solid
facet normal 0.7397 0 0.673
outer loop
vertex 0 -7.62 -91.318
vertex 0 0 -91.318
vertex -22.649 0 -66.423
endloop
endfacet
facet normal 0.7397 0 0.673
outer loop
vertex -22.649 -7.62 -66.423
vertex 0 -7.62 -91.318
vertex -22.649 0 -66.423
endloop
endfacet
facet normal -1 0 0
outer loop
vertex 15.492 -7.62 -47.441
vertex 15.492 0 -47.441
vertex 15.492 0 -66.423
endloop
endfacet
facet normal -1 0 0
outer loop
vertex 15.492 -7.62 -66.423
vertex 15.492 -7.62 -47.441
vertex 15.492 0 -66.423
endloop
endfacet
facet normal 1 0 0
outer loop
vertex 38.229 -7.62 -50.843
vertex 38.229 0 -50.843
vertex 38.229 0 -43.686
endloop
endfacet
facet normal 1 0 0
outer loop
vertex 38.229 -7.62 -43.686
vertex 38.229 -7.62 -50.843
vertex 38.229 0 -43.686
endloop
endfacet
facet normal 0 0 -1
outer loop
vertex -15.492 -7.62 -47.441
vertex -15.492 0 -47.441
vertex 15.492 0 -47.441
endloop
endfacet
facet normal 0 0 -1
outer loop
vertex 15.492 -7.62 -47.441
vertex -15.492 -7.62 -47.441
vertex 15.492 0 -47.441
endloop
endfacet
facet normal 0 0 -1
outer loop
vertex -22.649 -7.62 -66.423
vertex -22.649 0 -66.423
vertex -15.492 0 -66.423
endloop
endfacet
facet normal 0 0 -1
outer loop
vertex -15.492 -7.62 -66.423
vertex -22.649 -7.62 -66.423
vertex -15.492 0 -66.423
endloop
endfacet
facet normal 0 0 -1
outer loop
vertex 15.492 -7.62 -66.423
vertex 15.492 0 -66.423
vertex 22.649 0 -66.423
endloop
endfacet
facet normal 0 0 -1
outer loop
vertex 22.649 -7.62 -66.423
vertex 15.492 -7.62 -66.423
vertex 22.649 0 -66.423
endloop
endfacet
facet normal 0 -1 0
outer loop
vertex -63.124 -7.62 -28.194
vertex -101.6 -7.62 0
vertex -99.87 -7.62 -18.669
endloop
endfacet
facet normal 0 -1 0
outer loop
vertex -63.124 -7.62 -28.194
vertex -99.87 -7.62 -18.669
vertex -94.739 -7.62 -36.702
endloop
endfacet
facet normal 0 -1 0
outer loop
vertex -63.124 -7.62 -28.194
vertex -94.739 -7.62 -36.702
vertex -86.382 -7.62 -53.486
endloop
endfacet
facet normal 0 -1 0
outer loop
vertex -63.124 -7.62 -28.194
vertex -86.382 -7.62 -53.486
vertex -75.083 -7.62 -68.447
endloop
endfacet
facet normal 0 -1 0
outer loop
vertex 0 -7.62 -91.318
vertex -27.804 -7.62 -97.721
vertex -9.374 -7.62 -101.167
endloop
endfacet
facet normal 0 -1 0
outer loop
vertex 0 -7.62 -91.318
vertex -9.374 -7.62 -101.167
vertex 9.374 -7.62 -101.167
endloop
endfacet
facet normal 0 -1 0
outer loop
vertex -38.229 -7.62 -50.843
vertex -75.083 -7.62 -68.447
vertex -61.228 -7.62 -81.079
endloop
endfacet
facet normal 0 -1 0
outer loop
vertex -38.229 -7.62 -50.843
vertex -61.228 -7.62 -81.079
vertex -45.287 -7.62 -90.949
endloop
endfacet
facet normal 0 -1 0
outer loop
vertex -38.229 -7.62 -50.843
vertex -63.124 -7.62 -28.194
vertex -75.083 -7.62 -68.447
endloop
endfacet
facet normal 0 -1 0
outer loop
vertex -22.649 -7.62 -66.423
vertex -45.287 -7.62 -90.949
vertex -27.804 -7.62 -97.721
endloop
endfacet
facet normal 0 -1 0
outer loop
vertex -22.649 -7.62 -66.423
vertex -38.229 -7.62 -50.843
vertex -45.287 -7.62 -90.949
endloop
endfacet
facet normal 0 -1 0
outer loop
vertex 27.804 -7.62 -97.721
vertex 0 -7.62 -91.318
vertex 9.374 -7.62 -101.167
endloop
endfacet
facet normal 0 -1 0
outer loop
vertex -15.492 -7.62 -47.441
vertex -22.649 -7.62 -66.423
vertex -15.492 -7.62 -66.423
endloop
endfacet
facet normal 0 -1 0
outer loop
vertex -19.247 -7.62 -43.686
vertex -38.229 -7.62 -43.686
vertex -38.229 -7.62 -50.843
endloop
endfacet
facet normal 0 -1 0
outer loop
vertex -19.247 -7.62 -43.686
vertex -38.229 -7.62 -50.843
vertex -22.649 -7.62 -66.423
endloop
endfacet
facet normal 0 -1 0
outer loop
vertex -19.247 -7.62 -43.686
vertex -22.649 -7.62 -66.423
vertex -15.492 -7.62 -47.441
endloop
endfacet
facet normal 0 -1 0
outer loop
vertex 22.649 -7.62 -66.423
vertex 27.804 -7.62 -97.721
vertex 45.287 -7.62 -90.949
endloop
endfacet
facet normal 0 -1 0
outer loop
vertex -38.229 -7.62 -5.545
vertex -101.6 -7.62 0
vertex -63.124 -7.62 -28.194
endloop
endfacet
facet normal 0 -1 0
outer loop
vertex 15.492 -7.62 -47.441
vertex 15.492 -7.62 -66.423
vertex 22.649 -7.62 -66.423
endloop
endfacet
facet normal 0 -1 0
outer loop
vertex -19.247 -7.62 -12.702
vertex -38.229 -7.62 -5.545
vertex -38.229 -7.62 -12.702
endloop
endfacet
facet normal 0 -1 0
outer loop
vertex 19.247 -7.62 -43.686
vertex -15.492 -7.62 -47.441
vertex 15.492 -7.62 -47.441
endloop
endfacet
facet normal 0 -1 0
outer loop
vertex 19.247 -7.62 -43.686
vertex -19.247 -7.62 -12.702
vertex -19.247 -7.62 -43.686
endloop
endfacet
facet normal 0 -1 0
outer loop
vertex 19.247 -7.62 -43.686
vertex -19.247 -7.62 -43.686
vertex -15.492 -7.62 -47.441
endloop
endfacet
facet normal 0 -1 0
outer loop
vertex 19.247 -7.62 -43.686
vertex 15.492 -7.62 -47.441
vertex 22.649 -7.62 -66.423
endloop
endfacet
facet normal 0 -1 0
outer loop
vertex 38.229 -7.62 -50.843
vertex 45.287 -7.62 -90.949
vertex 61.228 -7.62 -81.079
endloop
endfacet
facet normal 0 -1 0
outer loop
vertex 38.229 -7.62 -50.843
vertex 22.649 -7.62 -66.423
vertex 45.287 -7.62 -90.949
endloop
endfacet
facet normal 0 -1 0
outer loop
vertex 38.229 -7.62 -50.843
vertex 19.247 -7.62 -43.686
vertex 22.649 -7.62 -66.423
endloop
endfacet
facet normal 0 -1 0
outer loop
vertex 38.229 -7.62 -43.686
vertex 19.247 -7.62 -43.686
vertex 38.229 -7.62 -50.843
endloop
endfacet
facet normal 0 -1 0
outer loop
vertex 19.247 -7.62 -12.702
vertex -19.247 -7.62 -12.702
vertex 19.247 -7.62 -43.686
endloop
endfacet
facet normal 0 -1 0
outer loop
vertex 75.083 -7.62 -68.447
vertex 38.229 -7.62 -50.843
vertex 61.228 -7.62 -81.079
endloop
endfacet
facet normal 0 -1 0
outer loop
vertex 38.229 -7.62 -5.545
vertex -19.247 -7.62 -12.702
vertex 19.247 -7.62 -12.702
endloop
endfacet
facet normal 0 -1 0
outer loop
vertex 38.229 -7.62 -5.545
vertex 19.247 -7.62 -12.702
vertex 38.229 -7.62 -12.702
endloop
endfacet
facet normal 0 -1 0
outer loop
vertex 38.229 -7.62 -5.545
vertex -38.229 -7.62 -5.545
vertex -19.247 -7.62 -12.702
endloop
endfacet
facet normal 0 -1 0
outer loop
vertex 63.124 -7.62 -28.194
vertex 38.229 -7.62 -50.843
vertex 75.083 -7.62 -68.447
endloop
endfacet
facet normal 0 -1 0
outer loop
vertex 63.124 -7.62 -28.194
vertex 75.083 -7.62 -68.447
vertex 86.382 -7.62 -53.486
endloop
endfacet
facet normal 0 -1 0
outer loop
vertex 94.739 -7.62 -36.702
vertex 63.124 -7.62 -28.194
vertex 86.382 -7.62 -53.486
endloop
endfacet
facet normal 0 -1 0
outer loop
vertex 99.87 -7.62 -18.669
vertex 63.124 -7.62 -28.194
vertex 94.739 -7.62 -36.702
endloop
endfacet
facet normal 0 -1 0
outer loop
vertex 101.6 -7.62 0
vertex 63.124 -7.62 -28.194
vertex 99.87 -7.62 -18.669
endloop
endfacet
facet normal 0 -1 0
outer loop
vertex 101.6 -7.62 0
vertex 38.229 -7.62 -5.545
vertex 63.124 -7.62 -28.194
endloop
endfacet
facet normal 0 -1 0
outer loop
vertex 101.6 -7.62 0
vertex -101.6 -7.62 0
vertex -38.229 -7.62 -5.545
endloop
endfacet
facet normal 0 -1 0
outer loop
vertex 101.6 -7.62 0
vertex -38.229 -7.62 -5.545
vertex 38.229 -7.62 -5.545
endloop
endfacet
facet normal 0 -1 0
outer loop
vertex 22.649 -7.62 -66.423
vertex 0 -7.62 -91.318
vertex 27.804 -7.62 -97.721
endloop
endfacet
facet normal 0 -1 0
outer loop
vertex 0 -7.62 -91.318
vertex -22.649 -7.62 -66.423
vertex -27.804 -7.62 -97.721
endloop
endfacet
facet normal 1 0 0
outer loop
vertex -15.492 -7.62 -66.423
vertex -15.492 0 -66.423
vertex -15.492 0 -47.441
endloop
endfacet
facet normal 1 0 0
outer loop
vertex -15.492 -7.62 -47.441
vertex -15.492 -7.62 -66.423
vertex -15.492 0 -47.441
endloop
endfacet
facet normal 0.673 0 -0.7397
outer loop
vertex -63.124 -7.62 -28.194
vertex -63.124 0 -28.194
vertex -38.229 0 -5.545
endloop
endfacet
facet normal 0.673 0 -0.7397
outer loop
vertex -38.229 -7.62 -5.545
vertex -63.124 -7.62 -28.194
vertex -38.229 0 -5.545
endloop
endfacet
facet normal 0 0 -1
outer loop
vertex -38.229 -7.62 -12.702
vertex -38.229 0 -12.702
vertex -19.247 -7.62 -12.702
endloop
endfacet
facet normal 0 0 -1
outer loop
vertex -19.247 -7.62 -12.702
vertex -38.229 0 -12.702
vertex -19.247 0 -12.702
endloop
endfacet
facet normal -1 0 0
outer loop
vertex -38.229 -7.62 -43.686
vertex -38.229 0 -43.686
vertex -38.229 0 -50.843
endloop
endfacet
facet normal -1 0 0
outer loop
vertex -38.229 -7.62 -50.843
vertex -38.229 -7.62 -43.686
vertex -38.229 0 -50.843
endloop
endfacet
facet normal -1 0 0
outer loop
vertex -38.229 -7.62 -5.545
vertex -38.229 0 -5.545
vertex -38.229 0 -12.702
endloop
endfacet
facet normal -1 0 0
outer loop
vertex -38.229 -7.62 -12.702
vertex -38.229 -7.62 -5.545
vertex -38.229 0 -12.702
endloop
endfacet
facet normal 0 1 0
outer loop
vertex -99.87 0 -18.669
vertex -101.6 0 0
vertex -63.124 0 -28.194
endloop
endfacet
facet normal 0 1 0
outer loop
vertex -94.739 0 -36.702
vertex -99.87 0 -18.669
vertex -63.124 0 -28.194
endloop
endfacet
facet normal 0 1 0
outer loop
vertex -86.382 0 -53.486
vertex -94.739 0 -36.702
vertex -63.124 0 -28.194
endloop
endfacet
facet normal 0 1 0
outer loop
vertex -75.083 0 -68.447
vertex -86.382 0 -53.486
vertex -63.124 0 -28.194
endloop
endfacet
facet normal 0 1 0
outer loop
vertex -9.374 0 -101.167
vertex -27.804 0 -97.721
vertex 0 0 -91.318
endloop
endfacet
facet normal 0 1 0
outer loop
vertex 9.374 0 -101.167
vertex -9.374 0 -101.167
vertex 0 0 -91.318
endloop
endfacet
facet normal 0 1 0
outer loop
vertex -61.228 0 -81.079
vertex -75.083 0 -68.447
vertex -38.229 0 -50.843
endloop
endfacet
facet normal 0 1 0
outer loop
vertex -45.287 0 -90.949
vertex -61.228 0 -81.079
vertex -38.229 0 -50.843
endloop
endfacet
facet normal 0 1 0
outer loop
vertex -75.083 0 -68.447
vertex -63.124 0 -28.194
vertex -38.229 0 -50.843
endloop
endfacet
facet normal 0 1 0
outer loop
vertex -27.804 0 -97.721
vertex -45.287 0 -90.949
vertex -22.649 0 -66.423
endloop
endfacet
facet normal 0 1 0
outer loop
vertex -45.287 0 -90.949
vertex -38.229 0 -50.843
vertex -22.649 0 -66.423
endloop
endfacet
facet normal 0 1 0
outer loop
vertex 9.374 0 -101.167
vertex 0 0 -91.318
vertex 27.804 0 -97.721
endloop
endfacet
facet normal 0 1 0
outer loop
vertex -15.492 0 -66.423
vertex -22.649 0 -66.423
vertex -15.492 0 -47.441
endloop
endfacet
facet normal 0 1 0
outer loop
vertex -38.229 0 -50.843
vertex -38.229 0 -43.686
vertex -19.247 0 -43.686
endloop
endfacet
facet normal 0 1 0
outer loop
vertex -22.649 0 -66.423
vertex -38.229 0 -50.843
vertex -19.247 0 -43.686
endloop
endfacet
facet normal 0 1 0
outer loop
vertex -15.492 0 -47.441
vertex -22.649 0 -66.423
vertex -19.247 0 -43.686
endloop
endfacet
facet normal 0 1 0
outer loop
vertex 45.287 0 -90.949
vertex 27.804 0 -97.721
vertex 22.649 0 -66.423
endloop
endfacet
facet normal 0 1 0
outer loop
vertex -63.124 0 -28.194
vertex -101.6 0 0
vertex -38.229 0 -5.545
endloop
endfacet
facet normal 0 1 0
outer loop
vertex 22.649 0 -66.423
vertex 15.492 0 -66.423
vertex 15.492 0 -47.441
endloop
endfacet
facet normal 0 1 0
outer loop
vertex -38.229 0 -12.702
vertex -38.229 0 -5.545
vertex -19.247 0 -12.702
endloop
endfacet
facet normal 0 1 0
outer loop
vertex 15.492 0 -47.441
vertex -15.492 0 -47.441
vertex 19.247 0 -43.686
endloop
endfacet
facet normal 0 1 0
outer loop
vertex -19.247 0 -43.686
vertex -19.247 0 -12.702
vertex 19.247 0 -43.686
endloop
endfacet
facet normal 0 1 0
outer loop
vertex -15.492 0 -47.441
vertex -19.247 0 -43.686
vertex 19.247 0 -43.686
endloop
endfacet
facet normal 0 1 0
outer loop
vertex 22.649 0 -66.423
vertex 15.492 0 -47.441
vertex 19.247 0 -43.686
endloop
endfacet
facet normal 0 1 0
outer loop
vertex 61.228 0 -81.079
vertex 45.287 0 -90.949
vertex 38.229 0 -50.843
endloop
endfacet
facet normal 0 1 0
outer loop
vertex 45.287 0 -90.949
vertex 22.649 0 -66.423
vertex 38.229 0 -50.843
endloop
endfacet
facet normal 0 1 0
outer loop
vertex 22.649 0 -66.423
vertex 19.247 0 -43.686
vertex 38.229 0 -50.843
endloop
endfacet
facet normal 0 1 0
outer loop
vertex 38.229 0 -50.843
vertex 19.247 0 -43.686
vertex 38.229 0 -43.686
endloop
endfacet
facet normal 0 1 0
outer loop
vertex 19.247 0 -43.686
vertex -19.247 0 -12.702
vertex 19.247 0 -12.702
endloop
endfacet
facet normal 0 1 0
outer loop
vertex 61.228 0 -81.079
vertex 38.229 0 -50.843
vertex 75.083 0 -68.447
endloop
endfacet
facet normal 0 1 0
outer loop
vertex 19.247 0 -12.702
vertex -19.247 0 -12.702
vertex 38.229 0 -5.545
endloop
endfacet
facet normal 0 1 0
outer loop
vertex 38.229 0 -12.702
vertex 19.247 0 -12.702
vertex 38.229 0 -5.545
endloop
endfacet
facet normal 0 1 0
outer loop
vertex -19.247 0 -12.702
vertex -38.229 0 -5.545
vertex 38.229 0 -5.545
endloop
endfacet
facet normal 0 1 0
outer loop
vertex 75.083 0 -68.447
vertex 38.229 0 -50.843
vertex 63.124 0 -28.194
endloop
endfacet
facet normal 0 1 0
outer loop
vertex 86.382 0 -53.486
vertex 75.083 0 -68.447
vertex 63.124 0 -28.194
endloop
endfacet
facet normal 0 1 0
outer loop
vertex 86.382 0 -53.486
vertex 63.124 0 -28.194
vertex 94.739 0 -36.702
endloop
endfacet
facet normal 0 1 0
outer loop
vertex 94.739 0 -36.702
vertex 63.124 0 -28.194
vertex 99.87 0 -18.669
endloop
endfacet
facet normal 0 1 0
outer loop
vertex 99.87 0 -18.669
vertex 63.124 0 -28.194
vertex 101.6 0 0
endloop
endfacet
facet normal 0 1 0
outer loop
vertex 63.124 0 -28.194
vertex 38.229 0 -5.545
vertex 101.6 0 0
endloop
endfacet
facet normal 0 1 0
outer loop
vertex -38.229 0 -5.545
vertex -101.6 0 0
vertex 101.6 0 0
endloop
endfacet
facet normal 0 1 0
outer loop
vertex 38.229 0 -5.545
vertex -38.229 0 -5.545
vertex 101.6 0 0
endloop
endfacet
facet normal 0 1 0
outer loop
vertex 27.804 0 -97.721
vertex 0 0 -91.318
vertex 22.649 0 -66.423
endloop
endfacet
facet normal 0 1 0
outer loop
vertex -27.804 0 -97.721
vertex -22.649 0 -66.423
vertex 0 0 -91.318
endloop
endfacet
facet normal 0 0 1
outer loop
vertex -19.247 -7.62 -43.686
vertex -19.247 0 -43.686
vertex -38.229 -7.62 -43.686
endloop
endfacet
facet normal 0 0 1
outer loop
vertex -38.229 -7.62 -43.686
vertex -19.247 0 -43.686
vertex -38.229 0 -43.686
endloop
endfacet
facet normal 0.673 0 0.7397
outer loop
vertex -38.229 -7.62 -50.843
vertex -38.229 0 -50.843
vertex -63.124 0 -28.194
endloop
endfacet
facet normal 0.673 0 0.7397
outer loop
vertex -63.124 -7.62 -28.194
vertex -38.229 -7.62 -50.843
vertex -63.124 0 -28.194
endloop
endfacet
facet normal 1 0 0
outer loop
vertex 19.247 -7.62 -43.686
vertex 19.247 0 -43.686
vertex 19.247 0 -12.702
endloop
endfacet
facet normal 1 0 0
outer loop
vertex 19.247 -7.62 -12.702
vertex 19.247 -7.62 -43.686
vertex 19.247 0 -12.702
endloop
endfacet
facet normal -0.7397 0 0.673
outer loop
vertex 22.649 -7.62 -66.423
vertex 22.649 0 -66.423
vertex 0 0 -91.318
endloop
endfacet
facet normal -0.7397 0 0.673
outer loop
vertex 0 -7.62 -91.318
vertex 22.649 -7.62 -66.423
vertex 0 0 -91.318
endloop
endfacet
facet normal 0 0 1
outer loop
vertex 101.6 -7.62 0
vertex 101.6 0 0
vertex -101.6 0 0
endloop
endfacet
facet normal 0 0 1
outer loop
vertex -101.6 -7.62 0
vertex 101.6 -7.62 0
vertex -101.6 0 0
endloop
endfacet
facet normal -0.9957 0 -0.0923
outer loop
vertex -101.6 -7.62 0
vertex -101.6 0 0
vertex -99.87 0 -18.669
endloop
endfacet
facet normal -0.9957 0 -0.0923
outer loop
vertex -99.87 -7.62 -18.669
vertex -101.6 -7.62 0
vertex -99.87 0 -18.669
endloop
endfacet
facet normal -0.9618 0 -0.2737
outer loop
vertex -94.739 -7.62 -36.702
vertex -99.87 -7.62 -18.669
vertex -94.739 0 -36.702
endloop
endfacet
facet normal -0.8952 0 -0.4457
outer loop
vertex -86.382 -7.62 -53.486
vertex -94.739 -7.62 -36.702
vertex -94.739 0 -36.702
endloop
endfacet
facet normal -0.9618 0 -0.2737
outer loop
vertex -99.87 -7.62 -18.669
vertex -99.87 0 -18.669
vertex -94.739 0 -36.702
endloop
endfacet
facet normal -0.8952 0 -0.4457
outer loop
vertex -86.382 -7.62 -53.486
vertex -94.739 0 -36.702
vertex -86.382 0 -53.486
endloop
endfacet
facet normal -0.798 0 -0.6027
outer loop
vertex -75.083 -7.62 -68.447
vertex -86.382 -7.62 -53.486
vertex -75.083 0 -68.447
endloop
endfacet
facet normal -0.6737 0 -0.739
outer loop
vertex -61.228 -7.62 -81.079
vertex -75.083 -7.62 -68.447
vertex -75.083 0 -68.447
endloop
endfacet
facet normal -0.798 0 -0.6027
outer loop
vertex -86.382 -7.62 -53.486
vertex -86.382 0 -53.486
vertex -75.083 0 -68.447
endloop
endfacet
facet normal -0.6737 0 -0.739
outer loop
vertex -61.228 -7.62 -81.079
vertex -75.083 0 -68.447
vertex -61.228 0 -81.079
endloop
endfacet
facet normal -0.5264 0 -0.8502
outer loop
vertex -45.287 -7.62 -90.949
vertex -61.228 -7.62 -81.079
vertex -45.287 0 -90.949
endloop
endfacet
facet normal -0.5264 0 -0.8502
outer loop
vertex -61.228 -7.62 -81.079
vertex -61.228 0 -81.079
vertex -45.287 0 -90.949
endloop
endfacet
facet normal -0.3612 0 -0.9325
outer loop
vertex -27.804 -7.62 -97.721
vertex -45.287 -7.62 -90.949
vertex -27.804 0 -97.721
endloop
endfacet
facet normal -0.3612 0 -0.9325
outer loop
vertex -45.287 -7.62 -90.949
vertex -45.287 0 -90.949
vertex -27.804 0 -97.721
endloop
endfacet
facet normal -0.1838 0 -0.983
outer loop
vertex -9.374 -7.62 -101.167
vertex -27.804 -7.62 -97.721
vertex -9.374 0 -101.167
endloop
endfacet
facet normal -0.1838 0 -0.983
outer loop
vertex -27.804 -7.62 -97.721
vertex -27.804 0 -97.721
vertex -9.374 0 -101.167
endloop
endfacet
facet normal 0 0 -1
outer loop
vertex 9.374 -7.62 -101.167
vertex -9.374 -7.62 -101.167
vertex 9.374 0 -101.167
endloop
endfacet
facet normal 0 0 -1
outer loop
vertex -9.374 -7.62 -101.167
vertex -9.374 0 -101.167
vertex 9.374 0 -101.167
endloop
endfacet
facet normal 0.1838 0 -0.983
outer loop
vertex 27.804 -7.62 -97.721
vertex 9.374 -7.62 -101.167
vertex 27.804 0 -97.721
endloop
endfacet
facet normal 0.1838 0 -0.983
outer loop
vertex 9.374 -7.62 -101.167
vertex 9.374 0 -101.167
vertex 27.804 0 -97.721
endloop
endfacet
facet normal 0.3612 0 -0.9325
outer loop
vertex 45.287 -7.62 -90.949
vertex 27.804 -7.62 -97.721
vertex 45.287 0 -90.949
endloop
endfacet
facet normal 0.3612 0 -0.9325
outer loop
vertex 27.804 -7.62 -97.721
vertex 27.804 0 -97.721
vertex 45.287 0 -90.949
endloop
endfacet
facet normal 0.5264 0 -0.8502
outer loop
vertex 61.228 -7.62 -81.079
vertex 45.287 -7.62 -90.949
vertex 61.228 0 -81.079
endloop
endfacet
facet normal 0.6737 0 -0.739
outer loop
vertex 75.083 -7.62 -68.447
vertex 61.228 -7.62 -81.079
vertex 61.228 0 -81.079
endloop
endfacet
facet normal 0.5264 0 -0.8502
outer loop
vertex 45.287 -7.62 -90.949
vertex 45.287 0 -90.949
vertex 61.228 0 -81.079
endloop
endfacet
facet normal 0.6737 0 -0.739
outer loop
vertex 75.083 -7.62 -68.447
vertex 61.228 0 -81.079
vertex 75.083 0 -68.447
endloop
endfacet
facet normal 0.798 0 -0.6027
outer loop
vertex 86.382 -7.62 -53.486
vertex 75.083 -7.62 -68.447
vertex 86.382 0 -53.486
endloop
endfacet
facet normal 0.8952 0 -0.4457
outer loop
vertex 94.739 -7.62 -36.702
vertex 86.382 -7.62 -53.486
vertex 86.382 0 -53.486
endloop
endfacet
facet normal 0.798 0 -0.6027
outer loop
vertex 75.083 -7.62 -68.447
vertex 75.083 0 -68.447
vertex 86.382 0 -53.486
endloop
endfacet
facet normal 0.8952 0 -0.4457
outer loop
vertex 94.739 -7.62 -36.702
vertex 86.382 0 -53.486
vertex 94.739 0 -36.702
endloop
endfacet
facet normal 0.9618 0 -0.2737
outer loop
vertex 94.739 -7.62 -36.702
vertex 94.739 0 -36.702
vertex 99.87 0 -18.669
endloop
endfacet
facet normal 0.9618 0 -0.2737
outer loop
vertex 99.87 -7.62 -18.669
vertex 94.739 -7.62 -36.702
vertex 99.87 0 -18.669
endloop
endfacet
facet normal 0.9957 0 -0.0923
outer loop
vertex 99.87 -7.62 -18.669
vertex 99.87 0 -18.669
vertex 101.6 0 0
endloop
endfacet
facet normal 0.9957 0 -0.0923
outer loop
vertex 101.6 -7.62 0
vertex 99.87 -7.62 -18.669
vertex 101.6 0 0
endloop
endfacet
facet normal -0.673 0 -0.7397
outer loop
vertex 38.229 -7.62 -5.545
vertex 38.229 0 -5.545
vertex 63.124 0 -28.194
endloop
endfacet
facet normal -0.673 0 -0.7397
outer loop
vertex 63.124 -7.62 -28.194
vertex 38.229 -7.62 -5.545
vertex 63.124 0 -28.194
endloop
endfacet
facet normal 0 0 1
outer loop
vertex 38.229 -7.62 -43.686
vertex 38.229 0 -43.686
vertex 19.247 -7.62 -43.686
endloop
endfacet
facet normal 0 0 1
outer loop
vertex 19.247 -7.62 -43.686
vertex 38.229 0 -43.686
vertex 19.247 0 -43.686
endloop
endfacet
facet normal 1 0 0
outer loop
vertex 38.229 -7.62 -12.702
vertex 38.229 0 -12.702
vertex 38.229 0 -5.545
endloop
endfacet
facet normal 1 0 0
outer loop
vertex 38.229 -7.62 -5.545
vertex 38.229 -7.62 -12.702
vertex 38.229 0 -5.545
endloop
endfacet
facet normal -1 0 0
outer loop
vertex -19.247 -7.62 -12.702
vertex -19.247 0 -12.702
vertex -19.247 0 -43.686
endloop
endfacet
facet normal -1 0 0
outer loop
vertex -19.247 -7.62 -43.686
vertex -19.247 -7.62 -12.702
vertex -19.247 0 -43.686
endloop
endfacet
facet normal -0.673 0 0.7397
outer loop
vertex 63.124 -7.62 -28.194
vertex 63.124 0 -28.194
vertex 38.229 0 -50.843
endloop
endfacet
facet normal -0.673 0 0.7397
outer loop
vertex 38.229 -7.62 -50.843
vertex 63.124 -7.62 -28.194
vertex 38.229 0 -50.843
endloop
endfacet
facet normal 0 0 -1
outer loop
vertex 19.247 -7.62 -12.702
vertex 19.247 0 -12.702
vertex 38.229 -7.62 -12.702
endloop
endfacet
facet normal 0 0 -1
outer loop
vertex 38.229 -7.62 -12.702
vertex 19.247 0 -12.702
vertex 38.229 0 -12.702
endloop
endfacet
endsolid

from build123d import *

# Parameters (mm, degrees)
F1_DEPTH = 7.62


with BuildPart() as f1:
    # F0 (on Front) → F1 (new body)
    with BuildSketch(Plane.XZ):
        with BuildLine():
            Line((101.6, 0), (0, 0))
            Line((0, 0), (-101.6, 0))
            ThreePointArc((-101.6, 0), (0, -101.6), (101.6, 0))
        make_face()
        Polygon((22.649135, -66.423178), (0, -91.317579), (-22.649135, -66.423178), (-15.491997, -66.423178), (-15.491997, -47.441199), (0, -47.441199), (15.491997, -47.441199), (15.491997, -66.423178), align=None, mode=Mode.SUBTRACT)
        Polygon((-19.247199, -28.194), (-19.247199, -43.685997), (-38.229178, -43.685997), (-38.229178, -50.843135), (-63.123579, -28.194), (-38.229178, -5.544865), (-38.229178, -12.702003), (-19.247199, -12.702003), align=None, mode=Mode.SUBTRACT)
        Polygon((19.247199, -28.194), (19.247199, -12.702003), (38.229178, -12.702003), (38.229178, -5.544865), (63.123579, -28.194), (38.229178, -50.843135), (38.229178, -43.685997), (19.247199, -43.685997), align=None, mode=Mode.SUBTRACT)
    extrude(amount=F1_DEPTH)


solid = f1.part
